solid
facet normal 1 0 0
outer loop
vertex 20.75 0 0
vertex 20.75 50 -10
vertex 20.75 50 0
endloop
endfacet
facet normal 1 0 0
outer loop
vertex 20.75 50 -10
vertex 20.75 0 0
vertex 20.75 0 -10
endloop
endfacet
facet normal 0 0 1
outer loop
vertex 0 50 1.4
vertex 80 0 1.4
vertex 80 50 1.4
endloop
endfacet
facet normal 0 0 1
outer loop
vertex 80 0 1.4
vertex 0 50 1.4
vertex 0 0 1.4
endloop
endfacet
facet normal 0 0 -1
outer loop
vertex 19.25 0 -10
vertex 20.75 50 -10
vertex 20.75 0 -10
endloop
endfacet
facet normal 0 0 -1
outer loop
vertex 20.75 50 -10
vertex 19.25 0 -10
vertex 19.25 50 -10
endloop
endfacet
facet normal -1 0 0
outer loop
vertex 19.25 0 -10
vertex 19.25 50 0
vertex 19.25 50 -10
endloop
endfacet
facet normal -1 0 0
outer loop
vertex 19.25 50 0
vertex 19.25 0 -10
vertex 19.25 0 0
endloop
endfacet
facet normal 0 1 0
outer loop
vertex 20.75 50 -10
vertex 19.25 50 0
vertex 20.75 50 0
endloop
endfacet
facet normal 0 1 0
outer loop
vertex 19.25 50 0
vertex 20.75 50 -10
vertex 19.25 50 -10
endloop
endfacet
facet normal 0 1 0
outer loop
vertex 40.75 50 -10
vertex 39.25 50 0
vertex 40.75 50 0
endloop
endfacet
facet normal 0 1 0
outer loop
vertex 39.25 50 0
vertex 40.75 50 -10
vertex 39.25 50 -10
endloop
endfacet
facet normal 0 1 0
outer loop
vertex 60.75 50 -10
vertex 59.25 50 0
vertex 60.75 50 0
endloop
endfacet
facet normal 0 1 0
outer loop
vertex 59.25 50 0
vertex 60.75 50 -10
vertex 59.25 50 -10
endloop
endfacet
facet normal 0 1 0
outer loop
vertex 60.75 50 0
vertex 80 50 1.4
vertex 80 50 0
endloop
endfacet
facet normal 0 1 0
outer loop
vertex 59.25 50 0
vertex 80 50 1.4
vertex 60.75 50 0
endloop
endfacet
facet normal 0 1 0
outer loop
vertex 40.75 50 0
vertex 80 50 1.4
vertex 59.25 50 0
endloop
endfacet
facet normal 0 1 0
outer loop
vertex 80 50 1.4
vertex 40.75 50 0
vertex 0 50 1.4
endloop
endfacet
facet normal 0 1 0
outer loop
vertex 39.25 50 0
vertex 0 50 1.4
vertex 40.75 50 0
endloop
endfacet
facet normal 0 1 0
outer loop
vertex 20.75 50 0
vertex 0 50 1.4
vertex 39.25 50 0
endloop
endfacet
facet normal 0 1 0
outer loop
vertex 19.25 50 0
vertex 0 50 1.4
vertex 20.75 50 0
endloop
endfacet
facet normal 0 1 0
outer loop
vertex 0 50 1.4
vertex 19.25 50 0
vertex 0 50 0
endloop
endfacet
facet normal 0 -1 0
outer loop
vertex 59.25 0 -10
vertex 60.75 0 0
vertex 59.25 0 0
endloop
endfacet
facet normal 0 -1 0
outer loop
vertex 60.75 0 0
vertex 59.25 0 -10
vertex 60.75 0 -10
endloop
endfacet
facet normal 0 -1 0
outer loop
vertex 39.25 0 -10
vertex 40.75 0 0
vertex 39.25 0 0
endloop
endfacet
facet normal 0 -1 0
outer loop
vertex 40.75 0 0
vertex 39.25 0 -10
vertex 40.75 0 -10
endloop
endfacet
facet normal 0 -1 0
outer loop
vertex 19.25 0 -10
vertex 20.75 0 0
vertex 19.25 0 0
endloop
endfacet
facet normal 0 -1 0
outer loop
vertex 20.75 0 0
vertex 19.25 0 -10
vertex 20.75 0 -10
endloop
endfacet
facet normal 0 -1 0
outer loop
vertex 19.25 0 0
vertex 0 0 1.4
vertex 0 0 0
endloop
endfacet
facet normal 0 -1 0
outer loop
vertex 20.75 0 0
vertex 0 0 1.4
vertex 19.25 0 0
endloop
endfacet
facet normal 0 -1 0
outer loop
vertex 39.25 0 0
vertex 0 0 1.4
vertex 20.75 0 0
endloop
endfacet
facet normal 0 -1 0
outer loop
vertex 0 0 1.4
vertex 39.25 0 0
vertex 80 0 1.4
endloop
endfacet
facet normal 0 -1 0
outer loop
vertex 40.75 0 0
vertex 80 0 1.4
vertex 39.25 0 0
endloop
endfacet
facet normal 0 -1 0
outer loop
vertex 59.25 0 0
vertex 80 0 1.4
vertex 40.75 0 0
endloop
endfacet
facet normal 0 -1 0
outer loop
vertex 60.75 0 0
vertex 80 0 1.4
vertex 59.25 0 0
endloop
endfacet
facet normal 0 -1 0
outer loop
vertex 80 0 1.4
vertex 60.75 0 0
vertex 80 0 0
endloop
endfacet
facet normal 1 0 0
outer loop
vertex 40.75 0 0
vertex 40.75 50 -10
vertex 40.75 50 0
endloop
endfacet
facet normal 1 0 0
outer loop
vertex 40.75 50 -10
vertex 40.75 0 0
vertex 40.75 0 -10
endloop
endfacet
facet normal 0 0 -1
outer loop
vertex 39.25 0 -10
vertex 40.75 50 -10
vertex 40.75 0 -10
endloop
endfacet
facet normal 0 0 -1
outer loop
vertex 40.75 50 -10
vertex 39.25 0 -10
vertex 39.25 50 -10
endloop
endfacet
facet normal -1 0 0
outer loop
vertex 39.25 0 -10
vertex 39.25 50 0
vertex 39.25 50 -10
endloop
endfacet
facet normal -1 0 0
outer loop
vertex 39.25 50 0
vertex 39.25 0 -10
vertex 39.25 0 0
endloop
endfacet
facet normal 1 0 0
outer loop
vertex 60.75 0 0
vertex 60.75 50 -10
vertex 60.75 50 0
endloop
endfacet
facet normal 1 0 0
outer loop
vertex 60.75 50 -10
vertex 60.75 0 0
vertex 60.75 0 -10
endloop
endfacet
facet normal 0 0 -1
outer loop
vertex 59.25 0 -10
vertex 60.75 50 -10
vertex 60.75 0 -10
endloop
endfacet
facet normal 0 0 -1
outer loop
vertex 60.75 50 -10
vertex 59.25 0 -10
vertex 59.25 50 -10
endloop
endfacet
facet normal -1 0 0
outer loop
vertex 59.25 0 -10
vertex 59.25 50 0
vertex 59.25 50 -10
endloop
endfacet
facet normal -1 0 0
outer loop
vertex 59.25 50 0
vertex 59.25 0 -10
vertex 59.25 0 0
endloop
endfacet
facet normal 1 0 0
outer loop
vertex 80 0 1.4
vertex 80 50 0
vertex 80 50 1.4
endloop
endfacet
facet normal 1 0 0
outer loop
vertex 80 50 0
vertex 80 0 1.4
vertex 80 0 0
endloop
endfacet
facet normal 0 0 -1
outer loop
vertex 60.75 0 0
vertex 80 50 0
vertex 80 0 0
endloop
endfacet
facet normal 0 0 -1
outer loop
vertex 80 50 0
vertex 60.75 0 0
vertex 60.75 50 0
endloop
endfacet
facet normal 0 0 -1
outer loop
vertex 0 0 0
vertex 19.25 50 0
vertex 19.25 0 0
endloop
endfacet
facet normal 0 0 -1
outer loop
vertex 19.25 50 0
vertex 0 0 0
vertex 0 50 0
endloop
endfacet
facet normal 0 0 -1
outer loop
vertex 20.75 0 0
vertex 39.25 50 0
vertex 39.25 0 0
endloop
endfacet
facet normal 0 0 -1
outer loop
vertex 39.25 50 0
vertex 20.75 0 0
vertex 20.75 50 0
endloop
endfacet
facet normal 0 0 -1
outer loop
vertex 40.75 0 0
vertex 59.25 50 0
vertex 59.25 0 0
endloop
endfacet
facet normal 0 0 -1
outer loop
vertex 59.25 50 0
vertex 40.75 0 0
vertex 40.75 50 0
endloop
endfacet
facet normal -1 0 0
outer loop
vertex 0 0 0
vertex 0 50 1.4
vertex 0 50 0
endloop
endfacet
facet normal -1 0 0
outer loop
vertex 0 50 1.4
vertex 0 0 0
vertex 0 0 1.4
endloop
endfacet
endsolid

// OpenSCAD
$fn = 32;

// ----------------------------------------------------------------------
// Ribbed panel: 1.4 mm panel
// ----------------------------------------------------------------------

// --- parameters (mm) ---
panel_l = 80;             // panel length, X
panel_w = 50;             // panel width, Y
panel_t = 1.4;            // panel thickness, Z
rib_t = 1.5;              // rib thickness
rib_h = 10;               // rib height below the panel
ribs = 3;                 // number of ribs

total_h = panel_t + rib_h;  // overall height

union() {
  cube([panel_l, panel_w, panel_t]);
  for (i = [1 : ribs])
    translate([i * panel_l / (ribs + 1) - rib_t / 2, 0, -rib_h])
      cube([rib_t, panel_w, rib_h + panel_t]);
}
